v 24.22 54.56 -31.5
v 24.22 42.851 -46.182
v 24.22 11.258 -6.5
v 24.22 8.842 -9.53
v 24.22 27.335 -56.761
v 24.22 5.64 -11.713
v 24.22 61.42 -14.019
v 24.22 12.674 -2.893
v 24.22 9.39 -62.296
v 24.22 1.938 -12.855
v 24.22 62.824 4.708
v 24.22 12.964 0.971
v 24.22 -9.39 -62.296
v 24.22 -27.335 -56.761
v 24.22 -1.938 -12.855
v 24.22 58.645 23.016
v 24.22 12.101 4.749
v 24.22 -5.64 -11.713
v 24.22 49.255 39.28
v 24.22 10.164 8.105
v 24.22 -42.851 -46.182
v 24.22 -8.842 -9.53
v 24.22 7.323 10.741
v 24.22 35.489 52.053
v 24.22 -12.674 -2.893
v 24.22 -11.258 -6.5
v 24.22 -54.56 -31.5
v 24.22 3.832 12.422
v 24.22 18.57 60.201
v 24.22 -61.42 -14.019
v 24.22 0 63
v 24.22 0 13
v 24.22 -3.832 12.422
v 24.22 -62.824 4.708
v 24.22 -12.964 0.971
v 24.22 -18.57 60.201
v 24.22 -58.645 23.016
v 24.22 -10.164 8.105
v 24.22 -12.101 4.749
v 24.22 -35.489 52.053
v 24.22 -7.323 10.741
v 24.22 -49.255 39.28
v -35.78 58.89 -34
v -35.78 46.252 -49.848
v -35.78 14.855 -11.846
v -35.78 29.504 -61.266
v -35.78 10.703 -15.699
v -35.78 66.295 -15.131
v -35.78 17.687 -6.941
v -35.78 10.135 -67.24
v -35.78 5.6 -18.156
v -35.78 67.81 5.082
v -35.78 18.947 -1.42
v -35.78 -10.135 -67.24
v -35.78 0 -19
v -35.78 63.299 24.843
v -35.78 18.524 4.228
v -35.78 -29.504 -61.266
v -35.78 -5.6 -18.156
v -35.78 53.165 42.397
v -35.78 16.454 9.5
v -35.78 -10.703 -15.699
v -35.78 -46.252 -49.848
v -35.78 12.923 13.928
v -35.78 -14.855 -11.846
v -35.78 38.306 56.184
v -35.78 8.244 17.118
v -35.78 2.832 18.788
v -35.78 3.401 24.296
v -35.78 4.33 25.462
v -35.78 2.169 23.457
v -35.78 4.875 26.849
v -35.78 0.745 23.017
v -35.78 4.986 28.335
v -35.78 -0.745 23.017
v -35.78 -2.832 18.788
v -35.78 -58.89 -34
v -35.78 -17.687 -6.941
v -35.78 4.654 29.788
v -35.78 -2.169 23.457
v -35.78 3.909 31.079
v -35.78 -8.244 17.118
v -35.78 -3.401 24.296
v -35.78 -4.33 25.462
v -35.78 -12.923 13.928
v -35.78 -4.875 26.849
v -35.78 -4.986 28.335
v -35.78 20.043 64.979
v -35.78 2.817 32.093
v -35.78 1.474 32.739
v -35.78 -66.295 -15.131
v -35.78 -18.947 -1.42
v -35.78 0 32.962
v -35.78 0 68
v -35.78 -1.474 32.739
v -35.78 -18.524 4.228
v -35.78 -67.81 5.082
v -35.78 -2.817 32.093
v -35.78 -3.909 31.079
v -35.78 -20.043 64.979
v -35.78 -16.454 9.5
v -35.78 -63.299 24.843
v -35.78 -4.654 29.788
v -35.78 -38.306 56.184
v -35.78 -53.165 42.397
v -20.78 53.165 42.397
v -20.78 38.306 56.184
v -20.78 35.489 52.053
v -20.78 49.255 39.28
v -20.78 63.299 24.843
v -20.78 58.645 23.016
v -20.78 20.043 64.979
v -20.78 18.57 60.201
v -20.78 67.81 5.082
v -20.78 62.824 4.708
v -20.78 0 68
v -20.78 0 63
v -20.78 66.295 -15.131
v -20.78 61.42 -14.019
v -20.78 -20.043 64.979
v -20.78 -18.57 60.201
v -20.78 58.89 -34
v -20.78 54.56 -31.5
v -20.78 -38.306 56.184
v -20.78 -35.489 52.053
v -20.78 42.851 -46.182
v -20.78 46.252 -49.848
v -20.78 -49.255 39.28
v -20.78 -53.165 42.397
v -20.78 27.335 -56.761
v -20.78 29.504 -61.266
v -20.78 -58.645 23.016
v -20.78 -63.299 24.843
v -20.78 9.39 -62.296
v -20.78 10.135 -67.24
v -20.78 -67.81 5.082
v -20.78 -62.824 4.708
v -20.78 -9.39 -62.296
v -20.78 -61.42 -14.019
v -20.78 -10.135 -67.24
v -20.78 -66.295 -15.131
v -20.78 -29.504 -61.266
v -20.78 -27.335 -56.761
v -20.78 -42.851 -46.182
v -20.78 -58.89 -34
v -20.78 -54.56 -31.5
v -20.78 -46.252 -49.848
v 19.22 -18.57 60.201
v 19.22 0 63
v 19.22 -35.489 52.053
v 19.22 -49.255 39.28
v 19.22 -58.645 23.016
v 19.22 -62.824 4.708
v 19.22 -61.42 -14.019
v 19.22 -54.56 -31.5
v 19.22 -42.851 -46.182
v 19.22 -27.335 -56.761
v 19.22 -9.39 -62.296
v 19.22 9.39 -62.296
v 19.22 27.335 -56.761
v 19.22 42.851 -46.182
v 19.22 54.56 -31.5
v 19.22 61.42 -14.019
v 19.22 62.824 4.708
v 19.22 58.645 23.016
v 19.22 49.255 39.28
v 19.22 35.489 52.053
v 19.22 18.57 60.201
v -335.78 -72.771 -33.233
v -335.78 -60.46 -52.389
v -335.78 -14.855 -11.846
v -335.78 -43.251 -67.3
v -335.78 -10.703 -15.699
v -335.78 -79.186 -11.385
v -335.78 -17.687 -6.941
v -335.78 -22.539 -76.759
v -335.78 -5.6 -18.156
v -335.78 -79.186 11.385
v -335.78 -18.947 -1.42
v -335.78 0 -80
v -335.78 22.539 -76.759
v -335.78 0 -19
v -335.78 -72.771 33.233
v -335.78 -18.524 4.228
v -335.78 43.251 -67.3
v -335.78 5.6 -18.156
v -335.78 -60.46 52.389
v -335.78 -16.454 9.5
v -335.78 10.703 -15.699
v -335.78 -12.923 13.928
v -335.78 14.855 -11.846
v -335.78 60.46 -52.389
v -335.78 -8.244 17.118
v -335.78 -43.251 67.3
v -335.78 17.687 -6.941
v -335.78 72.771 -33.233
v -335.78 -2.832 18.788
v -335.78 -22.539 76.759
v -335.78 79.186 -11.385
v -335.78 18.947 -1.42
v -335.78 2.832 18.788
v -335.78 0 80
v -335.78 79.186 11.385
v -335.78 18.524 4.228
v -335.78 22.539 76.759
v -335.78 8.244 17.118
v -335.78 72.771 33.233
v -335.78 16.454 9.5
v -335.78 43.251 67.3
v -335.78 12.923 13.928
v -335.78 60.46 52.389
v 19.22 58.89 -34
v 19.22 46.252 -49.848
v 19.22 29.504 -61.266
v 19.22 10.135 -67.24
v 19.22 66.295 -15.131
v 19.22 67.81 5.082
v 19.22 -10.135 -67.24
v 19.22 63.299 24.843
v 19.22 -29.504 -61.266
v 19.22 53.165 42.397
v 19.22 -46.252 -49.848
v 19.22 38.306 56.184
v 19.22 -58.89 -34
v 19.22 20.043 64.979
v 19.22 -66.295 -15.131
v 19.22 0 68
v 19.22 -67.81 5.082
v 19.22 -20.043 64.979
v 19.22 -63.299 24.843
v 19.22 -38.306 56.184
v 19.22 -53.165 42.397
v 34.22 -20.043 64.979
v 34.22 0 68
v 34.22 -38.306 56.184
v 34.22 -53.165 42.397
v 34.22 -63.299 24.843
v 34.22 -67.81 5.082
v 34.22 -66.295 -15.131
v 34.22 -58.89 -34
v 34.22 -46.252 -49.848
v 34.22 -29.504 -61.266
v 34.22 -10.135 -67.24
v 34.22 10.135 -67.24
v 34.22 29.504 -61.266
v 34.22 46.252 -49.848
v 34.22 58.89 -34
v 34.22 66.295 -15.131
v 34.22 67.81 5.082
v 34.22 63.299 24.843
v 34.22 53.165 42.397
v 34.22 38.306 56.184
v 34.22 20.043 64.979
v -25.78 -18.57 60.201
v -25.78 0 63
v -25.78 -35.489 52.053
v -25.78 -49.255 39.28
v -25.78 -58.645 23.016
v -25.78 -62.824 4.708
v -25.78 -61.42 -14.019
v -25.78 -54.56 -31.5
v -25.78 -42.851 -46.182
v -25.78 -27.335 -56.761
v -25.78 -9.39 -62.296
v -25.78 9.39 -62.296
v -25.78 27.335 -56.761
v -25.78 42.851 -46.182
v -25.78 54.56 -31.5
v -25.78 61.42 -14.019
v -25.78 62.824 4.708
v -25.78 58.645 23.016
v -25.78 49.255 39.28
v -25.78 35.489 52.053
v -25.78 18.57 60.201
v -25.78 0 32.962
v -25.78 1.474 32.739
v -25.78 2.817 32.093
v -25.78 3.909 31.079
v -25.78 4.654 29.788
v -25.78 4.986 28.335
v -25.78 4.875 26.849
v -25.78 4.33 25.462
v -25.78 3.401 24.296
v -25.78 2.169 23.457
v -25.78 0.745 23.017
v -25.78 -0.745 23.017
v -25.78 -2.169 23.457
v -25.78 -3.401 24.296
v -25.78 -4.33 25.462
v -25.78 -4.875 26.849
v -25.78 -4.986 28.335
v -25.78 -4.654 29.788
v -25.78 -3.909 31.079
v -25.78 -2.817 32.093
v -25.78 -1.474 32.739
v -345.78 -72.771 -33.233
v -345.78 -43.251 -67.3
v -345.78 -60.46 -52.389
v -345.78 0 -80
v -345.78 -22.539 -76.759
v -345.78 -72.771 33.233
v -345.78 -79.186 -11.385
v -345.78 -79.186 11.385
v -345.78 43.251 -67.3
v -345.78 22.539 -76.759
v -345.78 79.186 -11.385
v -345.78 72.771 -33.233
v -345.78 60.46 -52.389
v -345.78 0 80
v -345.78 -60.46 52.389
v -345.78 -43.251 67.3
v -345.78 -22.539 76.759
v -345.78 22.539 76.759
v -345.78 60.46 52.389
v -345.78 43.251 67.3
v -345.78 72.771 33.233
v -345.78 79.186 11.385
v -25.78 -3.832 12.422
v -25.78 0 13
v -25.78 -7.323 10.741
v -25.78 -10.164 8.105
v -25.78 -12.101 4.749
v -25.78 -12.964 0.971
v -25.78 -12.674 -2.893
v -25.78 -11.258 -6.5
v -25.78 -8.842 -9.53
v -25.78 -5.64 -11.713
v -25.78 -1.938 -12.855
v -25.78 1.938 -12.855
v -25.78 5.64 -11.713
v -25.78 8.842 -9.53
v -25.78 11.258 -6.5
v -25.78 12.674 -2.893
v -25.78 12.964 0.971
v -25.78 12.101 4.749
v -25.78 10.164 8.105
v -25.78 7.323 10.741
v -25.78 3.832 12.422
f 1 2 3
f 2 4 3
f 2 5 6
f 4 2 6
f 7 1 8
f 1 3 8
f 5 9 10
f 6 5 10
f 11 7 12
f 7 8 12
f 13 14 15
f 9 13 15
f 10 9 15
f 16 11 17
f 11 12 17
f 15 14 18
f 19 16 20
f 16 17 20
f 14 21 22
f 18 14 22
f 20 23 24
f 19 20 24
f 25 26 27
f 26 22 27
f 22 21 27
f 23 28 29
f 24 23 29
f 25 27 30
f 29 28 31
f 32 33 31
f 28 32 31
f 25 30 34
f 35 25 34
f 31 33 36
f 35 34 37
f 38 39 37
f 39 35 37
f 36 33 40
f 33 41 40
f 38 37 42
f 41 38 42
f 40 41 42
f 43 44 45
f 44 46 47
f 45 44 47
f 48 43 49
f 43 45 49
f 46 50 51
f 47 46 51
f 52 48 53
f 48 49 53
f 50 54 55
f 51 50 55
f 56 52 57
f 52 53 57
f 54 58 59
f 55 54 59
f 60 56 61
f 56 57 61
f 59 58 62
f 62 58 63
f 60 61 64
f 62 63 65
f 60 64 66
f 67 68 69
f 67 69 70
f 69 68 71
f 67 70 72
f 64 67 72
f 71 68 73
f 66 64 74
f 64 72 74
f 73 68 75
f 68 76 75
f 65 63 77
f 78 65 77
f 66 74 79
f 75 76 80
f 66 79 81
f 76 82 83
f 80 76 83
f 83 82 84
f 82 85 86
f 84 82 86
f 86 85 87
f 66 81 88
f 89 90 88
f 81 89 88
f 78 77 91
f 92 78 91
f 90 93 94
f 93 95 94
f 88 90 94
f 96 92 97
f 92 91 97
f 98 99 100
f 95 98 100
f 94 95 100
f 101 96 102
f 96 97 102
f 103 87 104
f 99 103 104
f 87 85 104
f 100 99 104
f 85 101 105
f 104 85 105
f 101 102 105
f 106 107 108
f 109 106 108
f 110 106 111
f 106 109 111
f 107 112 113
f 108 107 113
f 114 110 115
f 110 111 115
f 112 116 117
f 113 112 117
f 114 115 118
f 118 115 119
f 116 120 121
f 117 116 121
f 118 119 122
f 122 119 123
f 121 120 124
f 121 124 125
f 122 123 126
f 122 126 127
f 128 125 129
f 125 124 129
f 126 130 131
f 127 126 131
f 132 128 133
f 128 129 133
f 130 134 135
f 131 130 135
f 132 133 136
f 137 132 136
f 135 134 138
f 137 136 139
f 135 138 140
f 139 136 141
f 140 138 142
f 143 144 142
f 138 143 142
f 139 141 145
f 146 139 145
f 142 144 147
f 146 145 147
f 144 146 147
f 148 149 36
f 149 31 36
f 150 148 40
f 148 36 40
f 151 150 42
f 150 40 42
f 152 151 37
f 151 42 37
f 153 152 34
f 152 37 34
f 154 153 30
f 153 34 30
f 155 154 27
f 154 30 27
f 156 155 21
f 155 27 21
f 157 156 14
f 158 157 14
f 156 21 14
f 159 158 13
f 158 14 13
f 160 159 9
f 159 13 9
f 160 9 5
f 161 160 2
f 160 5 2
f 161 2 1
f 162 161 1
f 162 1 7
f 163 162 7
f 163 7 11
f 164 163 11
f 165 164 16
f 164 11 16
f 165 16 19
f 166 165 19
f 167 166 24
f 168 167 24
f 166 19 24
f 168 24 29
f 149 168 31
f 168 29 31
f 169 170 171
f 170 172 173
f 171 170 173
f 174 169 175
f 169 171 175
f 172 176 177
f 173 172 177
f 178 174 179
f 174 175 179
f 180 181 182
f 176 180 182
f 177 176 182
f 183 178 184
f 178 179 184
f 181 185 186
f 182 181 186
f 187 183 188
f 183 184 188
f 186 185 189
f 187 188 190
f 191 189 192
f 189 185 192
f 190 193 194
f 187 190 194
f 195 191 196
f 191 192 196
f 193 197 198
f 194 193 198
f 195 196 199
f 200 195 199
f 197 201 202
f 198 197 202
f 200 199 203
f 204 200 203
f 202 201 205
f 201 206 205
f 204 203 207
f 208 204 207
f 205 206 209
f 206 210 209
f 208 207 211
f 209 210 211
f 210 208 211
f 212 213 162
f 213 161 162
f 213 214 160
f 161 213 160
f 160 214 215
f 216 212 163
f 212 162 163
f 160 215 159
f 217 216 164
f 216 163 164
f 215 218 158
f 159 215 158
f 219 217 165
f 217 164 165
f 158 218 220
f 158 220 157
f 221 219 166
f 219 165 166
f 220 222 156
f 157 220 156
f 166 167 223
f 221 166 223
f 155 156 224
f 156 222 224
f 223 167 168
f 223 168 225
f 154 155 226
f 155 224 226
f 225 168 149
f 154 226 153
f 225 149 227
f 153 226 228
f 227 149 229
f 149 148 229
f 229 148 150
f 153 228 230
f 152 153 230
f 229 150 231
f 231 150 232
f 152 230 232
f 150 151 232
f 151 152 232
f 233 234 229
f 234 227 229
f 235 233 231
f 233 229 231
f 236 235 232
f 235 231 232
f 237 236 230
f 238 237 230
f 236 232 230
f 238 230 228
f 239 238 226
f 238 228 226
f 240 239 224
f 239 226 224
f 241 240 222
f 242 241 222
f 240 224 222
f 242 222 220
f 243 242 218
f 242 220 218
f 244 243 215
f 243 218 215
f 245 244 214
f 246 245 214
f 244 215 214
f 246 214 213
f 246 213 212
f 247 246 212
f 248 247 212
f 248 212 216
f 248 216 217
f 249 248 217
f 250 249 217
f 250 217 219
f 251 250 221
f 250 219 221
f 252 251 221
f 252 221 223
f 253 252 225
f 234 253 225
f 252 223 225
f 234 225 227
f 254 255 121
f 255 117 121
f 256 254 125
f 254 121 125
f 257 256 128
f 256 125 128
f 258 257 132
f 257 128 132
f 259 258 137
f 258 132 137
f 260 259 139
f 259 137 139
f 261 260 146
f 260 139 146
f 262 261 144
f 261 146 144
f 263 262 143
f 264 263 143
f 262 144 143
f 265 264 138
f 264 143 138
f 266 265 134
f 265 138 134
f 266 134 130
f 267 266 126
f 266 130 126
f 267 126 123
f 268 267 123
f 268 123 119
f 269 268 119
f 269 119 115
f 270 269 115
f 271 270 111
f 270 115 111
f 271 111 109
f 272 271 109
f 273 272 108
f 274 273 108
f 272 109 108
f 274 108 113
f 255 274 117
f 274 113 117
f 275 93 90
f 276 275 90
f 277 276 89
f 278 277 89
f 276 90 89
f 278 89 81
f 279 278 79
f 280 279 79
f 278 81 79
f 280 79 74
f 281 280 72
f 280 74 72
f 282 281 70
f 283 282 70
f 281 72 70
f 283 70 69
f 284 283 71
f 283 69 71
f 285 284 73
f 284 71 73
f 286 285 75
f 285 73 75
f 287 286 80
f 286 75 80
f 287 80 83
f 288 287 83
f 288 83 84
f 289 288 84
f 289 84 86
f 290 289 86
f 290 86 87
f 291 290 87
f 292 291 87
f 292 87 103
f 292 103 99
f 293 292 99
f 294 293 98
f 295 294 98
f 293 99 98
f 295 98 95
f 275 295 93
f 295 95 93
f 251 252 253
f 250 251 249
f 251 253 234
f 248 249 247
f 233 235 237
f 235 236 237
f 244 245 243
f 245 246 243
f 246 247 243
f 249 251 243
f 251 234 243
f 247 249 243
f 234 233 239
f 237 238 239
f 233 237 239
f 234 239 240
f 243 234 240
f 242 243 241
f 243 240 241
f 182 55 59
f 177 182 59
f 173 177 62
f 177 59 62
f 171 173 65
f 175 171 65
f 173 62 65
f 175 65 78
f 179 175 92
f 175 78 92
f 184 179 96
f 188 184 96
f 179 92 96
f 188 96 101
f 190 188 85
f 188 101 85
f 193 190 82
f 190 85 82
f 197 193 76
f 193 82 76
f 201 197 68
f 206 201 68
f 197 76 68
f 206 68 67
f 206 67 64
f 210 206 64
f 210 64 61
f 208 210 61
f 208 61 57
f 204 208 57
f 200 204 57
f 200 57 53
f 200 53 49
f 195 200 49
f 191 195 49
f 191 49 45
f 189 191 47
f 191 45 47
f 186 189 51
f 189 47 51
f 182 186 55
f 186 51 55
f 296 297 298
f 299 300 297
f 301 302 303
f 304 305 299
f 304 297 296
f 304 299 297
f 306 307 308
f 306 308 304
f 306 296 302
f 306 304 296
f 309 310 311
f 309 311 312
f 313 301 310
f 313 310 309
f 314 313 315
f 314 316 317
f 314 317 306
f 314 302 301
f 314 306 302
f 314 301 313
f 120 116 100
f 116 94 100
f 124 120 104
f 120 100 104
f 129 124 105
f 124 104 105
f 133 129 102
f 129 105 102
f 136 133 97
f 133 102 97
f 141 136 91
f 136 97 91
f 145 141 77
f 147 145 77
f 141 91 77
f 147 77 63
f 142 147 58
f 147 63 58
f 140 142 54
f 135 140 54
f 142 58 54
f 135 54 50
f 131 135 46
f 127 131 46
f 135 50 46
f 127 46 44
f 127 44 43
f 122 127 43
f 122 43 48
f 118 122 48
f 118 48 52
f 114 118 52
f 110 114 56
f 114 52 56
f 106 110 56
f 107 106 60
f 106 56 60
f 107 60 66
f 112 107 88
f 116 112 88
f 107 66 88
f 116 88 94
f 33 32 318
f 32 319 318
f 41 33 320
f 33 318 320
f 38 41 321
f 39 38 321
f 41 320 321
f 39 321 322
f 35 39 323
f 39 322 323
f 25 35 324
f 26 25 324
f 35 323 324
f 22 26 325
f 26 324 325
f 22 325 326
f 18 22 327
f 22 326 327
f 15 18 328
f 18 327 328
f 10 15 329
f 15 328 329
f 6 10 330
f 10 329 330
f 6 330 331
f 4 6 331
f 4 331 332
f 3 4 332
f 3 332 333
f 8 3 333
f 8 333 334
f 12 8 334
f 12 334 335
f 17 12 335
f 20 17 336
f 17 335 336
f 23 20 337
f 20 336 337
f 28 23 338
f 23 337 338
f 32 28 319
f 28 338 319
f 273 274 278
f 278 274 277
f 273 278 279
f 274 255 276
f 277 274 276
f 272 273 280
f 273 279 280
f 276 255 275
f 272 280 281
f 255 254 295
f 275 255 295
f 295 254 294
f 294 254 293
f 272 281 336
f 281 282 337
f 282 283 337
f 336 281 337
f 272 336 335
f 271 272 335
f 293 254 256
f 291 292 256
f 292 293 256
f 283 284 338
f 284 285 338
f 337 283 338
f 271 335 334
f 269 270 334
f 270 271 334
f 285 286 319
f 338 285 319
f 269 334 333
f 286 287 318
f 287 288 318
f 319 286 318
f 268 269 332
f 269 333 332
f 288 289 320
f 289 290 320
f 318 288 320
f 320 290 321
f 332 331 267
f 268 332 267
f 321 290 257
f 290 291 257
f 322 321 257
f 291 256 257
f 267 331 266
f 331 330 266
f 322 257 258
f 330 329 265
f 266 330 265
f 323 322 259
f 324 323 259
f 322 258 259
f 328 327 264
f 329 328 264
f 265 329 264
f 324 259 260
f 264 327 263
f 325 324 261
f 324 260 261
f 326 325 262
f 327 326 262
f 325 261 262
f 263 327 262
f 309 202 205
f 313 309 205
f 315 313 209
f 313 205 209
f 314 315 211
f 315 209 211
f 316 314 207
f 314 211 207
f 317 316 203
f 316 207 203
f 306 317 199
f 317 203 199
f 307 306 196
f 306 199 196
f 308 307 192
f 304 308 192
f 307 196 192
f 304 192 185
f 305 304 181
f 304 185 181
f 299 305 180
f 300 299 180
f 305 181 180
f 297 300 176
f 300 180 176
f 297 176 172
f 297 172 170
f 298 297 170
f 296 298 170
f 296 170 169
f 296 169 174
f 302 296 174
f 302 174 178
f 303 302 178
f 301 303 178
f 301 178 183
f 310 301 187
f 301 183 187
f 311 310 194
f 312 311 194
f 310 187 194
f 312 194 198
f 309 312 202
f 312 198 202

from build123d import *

# Parameters (mm, degrees)
SKETCH2_R           = 19
BOSS_EXTRUDE1_DEPTH = 300
SKETCH3_R           = 5
CUT_EXTRUDE1_DEPTH  = 10
SKETCH4_R           = 80
BOSS_EXTRUDE2_DEPTH = 10


with BuildPart() as part:
    # Sketch1 → Revolve1 (revolve)
    with BuildSketch(Plane.XY, mode=Mode.PRIVATE) as revolve1_sk:
        Polygon((-35.7804045, 0), (34.2195955, 0), (34.2195955, 68), (19.2195955, 68), (19.2195955, 63), (24.2195955, 63), (24.2195955, 13), (-25.7804045, 13), (-25.7804045, 63), (-20.7804045, 63), (-20.7804045, 68), (-35.7804045, 68), align=None)
    revolve(revolve1_sk.sketch.rotate(Axis((-140.082607732, 0, 0), (1, 0, 0)), 90), axis=Axis((-140.082607732, 0, 0), (1, 0, 0)))

    # Sketch2 → Boss-Extrude1 (add)
    with BuildSketch(Plane.ZY.offset(35.7804045)):
        with Locations(Location((0, 0, 0), (0, 0, 180))):
            Circle(SKETCH2_R)
    extrude(amount=BOSS_EXTRUDE1_DEPTH)

    # Sketch3 → Cut-Extrude1 (cut)
    with BuildSketch(Plane.ZY.offset(35.7804045)):
        with Locations((27.961616464, 0)):
            Circle(SKETCH3_R)
    extrude(amount=-CUT_EXTRUDE1_DEPTH, mode=Mode.SUBTRACT)

    # Sketch4 → Boss-Extrude2 (add)
    with BuildSketch(Plane.ZY.offset(335.7804045)):
        Circle(SKETCH4_R)
    extrude(amount=BOSS_EXTRUDE2_DEPTH)


solid = part.part
